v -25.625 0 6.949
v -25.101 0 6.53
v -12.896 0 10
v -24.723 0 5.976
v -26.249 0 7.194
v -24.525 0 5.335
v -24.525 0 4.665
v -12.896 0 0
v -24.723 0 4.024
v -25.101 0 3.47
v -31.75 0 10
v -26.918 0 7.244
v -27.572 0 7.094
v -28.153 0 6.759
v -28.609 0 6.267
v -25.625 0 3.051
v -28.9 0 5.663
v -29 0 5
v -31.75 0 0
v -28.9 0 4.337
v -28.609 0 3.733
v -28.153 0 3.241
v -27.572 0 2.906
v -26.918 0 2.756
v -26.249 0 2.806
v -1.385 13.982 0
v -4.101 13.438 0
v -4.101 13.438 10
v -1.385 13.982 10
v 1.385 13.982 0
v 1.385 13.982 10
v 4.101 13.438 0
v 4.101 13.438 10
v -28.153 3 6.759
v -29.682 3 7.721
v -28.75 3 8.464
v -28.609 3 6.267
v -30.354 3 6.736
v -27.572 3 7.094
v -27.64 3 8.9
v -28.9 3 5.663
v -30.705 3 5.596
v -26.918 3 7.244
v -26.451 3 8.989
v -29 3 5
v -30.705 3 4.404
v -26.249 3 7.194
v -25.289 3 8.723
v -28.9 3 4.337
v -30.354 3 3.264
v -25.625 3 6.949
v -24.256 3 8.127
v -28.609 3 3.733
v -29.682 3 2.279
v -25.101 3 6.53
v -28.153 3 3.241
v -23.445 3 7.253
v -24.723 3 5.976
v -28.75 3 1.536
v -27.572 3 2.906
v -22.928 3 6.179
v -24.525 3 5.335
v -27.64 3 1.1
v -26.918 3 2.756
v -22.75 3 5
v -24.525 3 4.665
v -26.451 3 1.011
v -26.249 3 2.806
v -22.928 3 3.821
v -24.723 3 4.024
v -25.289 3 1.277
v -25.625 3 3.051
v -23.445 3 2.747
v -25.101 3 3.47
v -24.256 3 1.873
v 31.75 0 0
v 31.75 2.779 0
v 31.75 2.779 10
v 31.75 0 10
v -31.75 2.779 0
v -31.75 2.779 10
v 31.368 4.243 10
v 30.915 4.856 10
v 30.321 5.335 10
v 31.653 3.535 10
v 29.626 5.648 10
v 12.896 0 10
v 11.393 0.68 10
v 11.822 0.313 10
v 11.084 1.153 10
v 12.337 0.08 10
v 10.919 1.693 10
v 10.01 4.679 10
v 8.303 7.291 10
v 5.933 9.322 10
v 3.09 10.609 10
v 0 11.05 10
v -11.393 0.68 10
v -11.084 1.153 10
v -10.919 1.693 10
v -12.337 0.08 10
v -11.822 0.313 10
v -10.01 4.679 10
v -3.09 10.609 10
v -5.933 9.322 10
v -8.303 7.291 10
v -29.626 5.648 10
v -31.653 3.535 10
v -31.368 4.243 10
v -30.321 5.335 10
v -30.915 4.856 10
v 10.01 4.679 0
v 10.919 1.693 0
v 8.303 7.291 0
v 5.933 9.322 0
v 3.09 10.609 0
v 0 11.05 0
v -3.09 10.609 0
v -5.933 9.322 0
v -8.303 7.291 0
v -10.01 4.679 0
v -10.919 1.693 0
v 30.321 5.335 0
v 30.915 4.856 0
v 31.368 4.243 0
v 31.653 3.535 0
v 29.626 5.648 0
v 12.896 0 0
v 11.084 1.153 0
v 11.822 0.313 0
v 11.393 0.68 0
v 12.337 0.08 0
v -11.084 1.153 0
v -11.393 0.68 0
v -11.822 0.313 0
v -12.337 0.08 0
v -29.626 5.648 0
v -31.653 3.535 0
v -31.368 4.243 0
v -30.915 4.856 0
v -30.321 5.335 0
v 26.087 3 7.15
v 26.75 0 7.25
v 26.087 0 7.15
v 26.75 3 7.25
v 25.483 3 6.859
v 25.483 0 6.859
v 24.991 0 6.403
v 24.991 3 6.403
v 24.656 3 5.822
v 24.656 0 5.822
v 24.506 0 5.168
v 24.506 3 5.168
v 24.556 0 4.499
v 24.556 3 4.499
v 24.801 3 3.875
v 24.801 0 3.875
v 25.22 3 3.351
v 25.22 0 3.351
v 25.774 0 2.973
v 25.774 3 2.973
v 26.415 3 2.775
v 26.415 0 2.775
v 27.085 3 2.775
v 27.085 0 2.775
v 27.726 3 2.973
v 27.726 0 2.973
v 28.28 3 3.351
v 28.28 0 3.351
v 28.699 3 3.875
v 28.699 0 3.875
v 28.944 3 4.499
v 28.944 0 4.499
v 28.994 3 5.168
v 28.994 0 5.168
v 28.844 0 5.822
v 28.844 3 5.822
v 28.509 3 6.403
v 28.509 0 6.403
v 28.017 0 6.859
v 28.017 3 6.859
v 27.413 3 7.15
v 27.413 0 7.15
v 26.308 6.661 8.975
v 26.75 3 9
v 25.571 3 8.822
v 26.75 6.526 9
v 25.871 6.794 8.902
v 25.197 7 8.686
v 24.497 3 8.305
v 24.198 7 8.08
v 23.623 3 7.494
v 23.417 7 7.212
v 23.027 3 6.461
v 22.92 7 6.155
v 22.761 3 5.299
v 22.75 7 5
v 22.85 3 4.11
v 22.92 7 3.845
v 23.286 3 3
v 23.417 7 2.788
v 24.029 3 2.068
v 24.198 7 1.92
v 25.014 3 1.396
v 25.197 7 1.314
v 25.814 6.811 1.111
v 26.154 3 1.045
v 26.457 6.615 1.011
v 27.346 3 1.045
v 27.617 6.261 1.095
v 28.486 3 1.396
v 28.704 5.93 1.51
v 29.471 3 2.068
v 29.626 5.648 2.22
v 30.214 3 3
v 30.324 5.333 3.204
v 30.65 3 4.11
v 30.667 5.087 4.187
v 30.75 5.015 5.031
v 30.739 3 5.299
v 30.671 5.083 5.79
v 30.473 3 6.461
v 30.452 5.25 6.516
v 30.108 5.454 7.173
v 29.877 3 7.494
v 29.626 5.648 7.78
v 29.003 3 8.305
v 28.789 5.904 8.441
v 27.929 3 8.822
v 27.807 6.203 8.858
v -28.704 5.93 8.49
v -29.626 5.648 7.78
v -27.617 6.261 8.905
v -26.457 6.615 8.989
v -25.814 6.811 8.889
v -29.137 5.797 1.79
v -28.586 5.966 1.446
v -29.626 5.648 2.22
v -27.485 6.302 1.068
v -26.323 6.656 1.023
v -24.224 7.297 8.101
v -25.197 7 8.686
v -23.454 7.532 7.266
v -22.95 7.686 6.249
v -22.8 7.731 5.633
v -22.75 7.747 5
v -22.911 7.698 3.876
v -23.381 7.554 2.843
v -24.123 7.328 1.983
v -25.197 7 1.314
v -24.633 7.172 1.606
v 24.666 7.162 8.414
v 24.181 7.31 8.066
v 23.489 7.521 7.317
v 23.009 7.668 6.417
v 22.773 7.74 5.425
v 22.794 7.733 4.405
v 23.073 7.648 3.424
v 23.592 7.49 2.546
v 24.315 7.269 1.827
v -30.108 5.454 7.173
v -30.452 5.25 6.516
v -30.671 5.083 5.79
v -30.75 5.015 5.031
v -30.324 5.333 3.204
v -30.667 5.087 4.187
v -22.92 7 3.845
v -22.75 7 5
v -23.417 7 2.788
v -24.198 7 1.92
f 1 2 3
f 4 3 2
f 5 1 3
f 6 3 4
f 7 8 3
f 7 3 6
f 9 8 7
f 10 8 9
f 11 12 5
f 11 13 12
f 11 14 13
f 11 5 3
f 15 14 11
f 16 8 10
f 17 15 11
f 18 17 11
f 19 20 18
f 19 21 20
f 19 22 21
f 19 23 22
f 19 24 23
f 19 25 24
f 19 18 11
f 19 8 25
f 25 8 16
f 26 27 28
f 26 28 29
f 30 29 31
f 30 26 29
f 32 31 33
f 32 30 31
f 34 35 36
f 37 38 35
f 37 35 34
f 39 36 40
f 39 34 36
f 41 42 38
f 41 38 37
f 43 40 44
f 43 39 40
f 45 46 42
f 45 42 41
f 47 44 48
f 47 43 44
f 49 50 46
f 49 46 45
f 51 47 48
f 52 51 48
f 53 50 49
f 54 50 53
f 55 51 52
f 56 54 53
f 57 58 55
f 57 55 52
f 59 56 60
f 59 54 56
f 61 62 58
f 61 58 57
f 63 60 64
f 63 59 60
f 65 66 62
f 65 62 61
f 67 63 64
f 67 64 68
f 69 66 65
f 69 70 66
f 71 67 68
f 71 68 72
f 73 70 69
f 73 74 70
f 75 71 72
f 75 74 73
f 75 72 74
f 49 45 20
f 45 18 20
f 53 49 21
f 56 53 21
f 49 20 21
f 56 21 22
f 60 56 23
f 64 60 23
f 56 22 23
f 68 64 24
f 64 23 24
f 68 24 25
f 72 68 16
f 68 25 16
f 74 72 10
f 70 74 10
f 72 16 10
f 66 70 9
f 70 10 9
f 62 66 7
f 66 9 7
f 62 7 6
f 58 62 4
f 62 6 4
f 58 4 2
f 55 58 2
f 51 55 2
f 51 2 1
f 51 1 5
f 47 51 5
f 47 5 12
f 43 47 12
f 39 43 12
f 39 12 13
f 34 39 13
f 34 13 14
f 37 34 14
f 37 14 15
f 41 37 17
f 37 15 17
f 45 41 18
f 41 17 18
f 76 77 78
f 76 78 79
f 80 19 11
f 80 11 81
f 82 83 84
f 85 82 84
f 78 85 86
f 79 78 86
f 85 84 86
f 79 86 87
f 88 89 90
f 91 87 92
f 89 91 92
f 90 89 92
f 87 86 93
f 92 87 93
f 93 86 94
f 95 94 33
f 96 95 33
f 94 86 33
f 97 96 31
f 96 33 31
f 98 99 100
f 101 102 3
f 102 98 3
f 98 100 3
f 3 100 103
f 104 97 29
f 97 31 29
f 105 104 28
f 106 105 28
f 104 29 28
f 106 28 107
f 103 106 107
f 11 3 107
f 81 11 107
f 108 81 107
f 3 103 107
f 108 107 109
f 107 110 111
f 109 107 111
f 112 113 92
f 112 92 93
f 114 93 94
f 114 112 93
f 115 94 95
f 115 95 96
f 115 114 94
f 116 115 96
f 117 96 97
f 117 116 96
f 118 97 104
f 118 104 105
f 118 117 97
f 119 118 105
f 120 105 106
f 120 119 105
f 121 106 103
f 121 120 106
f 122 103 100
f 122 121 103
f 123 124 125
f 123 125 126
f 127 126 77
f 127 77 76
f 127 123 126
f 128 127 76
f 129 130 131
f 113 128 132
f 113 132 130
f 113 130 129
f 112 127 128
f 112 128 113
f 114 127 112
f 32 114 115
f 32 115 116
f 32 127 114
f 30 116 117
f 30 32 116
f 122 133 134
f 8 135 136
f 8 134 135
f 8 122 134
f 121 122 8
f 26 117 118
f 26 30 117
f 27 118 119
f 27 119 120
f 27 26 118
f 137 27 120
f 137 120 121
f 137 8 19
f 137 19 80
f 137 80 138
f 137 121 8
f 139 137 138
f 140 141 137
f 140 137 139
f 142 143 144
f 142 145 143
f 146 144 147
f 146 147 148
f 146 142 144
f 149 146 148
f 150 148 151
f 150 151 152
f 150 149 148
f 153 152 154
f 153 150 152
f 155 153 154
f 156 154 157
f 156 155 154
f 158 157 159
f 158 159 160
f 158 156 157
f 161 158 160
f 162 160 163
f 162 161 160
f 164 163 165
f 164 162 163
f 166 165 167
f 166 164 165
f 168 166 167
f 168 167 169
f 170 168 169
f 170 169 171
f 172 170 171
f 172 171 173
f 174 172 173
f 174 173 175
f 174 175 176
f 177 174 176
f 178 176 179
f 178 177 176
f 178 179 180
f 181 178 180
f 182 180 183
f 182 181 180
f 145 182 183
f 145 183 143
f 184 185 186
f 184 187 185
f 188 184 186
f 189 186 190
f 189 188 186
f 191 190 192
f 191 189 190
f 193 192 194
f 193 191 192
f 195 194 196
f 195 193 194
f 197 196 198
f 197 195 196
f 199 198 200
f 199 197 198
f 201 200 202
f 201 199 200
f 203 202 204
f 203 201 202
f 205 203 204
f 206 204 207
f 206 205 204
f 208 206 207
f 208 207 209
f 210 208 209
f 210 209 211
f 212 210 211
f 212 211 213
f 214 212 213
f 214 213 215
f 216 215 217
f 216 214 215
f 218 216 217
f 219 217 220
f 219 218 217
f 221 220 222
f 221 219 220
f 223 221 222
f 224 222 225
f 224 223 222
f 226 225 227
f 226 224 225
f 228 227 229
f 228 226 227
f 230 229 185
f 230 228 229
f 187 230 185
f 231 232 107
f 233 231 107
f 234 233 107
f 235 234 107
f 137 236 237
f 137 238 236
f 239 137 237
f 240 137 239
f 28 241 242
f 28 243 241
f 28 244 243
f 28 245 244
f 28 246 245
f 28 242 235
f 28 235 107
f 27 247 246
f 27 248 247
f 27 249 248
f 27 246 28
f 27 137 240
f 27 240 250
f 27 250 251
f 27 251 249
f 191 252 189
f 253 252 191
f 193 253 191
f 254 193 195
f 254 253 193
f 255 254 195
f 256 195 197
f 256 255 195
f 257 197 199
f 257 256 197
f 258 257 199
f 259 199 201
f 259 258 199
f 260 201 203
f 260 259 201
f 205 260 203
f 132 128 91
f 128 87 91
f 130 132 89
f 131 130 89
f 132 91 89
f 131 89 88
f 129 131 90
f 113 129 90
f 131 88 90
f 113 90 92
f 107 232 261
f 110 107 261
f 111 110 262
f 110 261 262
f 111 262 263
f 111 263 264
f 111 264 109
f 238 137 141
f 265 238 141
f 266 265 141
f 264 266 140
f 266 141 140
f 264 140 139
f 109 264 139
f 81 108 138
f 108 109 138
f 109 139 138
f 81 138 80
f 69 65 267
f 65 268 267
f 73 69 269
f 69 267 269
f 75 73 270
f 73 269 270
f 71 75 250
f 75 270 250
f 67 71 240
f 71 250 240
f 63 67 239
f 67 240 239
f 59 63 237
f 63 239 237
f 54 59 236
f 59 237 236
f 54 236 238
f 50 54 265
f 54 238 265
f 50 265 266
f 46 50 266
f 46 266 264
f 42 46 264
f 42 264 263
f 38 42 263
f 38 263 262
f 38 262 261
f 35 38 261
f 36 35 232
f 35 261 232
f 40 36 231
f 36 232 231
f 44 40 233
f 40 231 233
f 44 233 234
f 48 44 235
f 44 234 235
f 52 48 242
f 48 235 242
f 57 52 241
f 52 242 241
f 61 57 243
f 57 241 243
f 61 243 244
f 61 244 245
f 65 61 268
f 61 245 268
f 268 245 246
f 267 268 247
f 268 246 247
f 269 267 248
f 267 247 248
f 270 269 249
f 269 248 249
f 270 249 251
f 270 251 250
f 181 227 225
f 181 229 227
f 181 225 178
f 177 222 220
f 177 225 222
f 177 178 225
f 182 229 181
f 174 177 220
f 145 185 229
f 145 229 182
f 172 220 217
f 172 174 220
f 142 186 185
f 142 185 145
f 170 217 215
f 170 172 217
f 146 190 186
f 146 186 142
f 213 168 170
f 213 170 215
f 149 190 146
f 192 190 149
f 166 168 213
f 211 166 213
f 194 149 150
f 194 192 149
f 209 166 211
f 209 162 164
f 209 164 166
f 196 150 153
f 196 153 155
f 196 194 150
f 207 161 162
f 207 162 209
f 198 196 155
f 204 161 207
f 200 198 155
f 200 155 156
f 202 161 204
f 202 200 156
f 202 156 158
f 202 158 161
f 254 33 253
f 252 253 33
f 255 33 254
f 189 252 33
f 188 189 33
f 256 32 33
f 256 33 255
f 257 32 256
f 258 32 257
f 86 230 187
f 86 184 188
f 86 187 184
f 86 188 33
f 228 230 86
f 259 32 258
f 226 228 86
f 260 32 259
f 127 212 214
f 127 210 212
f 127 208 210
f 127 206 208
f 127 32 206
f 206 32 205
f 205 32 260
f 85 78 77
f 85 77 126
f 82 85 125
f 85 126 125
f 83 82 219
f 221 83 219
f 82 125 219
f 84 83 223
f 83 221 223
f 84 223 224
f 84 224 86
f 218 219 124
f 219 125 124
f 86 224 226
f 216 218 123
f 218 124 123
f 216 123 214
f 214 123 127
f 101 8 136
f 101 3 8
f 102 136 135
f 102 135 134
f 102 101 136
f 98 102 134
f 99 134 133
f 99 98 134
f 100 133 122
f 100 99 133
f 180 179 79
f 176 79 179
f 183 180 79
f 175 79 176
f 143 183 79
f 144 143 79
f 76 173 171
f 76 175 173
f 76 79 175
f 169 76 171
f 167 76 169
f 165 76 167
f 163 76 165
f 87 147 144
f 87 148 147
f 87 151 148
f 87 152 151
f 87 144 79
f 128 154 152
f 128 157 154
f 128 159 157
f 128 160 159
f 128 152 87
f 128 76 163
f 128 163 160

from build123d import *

# Parameters (mm, degrees)
EXTRUDE_1_DEPTH             = 10
HOLE_WIZARD_M43_D           = 4.5
HOLE_WIZARD_M43_CBORE_D     = 8
HOLE_WIZARD_M43_CBORE_DEPTH = 4
FILLET_4_R                  = 2
FILLET_2_R                  = 3


with BuildPart() as part:
    # Эскиз1 → Бобышка-Вытянуть1 (new body)
    with BuildSketch(Plane.XY):
        with BuildLine():
            Line((-31.75, 5), (-4.101162824, 13.438116069))
            ThreePointArc((-4.101162824, 13.438116069), (0, 14.05), (4.101162824, 13.438116069))
            Line((4.101162824, 13.438116069), (31.75, 5))
            Line((31.75, 5), (31.75, 0))
            Line((31.75, 0), (11.05, 0))
            ThreePointArc((11.05, 0), (0, 11.05), (-11.05, 0))
            Line((-11.05, 0), (-31.75, 0))
            Line((-31.75, 0), (-31.75, 5))
        make_face()
    extrude(amount=EXTRUDE_1_DEPTH)

    # Эскиз5 → Цековка для винта с внутренним шестигранником M42 (revolve, cut)
    with BuildSketch(Plane(origin=(-26.75, 7, 5), x_dir=(0, 0, -1), z_dir=(1, 0, 0))):
        Polygon((0, 0), (0, 7.05), (2.25, 7.05), (2.25, 4), (4, 4), (4, 0), align=None)
    revolve(axis=Axis((-26.75, 0.65, 5), (0, 1, 0)), mode=Mode.SUBTRACT)

    # Цековка для винта с внутренним шестигранником M43 (through all)
    with Locations(Plane(origin=(0, 7, 0), x_dir=(1, 0, 0), z_dir=(0, 1, 0))):
        with Locations((-26.75, -5)):
            CounterBoreHole(HOLE_WIZARD_M43_D / 2, HOLE_WIZARD_M43_CBORE_D / 2, HOLE_WIZARD_M43_CBORE_DEPTH)

    # Эскиз10 → Цековка для винта с внутренним шестигранником M44 (revolve, cut)
    with BuildSketch(Plane(origin=(26.75, 7, 5), x_dir=(0, 0, 1), z_dir=(1, 0, 0))):
        Polygon((0, 0), (0, 7), (2.25, 7), (2.25, 4), (4, 4), (4, 0), align=None)
    revolve(axis=Axis((26.75, 13.35, 5), (0, -1, 0)), mode=Mode.SUBTRACT)

    # Эскиз12 → Цековка для винта с внутренним шестигранником M45 (revolve, cut)
    with BuildSketch(Plane(origin=(26.75, 7, 5), x_dir=(0, 0, -1), z_dir=(1, 0, 0))):
        Polygon((0, 0), (0, 7.05), (2.25, 7.05), (2.25, 4), (4, 4), (4, 0), align=None)
    revolve(axis=Axis((26.75, 0.65, 5), (0, 1, 0)), mode=Mode.SUBTRACT)

    # Скругление4
    fillet_4_edges = [part.edges().sort_by_distance(p)[0] for p in [
        (-11.05, 0, 5),
        (11.05, 0, 5),
    ]]
    fillet(fillet_4_edges, radius=FILLET_4_R)

    # Скругление2
    # the kernel refuses this fillet: 3 mm, written as the material it takes off along each edge
    with BuildSketch(Plane(origin=(-31.75, 5, -5.552584785), x_dir=(0, -1, 0), z_dir=(0, 0, 1)), Plane(origin=(31.75, 5, -5.552584785), x_dir=(-0.95644954230243, 0.2918977098736336, 0), z_dir=(0, 0, 1))) as fillet_2_piece_1:
        with BuildLine():
            CenterArc((FILLET_2_R * 0.740344637964, FILLET_2_R), FILLET_2_R, 196.971603354, 73.028396646)
            Line((-FILLET_2_R * 0.216104904339, FILLET_2_R * 0.708102290126), (0, 0))
            Line((0, 0), (FILLET_2_R * 0.740344637964, 0))
        make_face()
    extrude(amount=21.105169569, mode=Mode.SUBTRACT)


solid = part.part
